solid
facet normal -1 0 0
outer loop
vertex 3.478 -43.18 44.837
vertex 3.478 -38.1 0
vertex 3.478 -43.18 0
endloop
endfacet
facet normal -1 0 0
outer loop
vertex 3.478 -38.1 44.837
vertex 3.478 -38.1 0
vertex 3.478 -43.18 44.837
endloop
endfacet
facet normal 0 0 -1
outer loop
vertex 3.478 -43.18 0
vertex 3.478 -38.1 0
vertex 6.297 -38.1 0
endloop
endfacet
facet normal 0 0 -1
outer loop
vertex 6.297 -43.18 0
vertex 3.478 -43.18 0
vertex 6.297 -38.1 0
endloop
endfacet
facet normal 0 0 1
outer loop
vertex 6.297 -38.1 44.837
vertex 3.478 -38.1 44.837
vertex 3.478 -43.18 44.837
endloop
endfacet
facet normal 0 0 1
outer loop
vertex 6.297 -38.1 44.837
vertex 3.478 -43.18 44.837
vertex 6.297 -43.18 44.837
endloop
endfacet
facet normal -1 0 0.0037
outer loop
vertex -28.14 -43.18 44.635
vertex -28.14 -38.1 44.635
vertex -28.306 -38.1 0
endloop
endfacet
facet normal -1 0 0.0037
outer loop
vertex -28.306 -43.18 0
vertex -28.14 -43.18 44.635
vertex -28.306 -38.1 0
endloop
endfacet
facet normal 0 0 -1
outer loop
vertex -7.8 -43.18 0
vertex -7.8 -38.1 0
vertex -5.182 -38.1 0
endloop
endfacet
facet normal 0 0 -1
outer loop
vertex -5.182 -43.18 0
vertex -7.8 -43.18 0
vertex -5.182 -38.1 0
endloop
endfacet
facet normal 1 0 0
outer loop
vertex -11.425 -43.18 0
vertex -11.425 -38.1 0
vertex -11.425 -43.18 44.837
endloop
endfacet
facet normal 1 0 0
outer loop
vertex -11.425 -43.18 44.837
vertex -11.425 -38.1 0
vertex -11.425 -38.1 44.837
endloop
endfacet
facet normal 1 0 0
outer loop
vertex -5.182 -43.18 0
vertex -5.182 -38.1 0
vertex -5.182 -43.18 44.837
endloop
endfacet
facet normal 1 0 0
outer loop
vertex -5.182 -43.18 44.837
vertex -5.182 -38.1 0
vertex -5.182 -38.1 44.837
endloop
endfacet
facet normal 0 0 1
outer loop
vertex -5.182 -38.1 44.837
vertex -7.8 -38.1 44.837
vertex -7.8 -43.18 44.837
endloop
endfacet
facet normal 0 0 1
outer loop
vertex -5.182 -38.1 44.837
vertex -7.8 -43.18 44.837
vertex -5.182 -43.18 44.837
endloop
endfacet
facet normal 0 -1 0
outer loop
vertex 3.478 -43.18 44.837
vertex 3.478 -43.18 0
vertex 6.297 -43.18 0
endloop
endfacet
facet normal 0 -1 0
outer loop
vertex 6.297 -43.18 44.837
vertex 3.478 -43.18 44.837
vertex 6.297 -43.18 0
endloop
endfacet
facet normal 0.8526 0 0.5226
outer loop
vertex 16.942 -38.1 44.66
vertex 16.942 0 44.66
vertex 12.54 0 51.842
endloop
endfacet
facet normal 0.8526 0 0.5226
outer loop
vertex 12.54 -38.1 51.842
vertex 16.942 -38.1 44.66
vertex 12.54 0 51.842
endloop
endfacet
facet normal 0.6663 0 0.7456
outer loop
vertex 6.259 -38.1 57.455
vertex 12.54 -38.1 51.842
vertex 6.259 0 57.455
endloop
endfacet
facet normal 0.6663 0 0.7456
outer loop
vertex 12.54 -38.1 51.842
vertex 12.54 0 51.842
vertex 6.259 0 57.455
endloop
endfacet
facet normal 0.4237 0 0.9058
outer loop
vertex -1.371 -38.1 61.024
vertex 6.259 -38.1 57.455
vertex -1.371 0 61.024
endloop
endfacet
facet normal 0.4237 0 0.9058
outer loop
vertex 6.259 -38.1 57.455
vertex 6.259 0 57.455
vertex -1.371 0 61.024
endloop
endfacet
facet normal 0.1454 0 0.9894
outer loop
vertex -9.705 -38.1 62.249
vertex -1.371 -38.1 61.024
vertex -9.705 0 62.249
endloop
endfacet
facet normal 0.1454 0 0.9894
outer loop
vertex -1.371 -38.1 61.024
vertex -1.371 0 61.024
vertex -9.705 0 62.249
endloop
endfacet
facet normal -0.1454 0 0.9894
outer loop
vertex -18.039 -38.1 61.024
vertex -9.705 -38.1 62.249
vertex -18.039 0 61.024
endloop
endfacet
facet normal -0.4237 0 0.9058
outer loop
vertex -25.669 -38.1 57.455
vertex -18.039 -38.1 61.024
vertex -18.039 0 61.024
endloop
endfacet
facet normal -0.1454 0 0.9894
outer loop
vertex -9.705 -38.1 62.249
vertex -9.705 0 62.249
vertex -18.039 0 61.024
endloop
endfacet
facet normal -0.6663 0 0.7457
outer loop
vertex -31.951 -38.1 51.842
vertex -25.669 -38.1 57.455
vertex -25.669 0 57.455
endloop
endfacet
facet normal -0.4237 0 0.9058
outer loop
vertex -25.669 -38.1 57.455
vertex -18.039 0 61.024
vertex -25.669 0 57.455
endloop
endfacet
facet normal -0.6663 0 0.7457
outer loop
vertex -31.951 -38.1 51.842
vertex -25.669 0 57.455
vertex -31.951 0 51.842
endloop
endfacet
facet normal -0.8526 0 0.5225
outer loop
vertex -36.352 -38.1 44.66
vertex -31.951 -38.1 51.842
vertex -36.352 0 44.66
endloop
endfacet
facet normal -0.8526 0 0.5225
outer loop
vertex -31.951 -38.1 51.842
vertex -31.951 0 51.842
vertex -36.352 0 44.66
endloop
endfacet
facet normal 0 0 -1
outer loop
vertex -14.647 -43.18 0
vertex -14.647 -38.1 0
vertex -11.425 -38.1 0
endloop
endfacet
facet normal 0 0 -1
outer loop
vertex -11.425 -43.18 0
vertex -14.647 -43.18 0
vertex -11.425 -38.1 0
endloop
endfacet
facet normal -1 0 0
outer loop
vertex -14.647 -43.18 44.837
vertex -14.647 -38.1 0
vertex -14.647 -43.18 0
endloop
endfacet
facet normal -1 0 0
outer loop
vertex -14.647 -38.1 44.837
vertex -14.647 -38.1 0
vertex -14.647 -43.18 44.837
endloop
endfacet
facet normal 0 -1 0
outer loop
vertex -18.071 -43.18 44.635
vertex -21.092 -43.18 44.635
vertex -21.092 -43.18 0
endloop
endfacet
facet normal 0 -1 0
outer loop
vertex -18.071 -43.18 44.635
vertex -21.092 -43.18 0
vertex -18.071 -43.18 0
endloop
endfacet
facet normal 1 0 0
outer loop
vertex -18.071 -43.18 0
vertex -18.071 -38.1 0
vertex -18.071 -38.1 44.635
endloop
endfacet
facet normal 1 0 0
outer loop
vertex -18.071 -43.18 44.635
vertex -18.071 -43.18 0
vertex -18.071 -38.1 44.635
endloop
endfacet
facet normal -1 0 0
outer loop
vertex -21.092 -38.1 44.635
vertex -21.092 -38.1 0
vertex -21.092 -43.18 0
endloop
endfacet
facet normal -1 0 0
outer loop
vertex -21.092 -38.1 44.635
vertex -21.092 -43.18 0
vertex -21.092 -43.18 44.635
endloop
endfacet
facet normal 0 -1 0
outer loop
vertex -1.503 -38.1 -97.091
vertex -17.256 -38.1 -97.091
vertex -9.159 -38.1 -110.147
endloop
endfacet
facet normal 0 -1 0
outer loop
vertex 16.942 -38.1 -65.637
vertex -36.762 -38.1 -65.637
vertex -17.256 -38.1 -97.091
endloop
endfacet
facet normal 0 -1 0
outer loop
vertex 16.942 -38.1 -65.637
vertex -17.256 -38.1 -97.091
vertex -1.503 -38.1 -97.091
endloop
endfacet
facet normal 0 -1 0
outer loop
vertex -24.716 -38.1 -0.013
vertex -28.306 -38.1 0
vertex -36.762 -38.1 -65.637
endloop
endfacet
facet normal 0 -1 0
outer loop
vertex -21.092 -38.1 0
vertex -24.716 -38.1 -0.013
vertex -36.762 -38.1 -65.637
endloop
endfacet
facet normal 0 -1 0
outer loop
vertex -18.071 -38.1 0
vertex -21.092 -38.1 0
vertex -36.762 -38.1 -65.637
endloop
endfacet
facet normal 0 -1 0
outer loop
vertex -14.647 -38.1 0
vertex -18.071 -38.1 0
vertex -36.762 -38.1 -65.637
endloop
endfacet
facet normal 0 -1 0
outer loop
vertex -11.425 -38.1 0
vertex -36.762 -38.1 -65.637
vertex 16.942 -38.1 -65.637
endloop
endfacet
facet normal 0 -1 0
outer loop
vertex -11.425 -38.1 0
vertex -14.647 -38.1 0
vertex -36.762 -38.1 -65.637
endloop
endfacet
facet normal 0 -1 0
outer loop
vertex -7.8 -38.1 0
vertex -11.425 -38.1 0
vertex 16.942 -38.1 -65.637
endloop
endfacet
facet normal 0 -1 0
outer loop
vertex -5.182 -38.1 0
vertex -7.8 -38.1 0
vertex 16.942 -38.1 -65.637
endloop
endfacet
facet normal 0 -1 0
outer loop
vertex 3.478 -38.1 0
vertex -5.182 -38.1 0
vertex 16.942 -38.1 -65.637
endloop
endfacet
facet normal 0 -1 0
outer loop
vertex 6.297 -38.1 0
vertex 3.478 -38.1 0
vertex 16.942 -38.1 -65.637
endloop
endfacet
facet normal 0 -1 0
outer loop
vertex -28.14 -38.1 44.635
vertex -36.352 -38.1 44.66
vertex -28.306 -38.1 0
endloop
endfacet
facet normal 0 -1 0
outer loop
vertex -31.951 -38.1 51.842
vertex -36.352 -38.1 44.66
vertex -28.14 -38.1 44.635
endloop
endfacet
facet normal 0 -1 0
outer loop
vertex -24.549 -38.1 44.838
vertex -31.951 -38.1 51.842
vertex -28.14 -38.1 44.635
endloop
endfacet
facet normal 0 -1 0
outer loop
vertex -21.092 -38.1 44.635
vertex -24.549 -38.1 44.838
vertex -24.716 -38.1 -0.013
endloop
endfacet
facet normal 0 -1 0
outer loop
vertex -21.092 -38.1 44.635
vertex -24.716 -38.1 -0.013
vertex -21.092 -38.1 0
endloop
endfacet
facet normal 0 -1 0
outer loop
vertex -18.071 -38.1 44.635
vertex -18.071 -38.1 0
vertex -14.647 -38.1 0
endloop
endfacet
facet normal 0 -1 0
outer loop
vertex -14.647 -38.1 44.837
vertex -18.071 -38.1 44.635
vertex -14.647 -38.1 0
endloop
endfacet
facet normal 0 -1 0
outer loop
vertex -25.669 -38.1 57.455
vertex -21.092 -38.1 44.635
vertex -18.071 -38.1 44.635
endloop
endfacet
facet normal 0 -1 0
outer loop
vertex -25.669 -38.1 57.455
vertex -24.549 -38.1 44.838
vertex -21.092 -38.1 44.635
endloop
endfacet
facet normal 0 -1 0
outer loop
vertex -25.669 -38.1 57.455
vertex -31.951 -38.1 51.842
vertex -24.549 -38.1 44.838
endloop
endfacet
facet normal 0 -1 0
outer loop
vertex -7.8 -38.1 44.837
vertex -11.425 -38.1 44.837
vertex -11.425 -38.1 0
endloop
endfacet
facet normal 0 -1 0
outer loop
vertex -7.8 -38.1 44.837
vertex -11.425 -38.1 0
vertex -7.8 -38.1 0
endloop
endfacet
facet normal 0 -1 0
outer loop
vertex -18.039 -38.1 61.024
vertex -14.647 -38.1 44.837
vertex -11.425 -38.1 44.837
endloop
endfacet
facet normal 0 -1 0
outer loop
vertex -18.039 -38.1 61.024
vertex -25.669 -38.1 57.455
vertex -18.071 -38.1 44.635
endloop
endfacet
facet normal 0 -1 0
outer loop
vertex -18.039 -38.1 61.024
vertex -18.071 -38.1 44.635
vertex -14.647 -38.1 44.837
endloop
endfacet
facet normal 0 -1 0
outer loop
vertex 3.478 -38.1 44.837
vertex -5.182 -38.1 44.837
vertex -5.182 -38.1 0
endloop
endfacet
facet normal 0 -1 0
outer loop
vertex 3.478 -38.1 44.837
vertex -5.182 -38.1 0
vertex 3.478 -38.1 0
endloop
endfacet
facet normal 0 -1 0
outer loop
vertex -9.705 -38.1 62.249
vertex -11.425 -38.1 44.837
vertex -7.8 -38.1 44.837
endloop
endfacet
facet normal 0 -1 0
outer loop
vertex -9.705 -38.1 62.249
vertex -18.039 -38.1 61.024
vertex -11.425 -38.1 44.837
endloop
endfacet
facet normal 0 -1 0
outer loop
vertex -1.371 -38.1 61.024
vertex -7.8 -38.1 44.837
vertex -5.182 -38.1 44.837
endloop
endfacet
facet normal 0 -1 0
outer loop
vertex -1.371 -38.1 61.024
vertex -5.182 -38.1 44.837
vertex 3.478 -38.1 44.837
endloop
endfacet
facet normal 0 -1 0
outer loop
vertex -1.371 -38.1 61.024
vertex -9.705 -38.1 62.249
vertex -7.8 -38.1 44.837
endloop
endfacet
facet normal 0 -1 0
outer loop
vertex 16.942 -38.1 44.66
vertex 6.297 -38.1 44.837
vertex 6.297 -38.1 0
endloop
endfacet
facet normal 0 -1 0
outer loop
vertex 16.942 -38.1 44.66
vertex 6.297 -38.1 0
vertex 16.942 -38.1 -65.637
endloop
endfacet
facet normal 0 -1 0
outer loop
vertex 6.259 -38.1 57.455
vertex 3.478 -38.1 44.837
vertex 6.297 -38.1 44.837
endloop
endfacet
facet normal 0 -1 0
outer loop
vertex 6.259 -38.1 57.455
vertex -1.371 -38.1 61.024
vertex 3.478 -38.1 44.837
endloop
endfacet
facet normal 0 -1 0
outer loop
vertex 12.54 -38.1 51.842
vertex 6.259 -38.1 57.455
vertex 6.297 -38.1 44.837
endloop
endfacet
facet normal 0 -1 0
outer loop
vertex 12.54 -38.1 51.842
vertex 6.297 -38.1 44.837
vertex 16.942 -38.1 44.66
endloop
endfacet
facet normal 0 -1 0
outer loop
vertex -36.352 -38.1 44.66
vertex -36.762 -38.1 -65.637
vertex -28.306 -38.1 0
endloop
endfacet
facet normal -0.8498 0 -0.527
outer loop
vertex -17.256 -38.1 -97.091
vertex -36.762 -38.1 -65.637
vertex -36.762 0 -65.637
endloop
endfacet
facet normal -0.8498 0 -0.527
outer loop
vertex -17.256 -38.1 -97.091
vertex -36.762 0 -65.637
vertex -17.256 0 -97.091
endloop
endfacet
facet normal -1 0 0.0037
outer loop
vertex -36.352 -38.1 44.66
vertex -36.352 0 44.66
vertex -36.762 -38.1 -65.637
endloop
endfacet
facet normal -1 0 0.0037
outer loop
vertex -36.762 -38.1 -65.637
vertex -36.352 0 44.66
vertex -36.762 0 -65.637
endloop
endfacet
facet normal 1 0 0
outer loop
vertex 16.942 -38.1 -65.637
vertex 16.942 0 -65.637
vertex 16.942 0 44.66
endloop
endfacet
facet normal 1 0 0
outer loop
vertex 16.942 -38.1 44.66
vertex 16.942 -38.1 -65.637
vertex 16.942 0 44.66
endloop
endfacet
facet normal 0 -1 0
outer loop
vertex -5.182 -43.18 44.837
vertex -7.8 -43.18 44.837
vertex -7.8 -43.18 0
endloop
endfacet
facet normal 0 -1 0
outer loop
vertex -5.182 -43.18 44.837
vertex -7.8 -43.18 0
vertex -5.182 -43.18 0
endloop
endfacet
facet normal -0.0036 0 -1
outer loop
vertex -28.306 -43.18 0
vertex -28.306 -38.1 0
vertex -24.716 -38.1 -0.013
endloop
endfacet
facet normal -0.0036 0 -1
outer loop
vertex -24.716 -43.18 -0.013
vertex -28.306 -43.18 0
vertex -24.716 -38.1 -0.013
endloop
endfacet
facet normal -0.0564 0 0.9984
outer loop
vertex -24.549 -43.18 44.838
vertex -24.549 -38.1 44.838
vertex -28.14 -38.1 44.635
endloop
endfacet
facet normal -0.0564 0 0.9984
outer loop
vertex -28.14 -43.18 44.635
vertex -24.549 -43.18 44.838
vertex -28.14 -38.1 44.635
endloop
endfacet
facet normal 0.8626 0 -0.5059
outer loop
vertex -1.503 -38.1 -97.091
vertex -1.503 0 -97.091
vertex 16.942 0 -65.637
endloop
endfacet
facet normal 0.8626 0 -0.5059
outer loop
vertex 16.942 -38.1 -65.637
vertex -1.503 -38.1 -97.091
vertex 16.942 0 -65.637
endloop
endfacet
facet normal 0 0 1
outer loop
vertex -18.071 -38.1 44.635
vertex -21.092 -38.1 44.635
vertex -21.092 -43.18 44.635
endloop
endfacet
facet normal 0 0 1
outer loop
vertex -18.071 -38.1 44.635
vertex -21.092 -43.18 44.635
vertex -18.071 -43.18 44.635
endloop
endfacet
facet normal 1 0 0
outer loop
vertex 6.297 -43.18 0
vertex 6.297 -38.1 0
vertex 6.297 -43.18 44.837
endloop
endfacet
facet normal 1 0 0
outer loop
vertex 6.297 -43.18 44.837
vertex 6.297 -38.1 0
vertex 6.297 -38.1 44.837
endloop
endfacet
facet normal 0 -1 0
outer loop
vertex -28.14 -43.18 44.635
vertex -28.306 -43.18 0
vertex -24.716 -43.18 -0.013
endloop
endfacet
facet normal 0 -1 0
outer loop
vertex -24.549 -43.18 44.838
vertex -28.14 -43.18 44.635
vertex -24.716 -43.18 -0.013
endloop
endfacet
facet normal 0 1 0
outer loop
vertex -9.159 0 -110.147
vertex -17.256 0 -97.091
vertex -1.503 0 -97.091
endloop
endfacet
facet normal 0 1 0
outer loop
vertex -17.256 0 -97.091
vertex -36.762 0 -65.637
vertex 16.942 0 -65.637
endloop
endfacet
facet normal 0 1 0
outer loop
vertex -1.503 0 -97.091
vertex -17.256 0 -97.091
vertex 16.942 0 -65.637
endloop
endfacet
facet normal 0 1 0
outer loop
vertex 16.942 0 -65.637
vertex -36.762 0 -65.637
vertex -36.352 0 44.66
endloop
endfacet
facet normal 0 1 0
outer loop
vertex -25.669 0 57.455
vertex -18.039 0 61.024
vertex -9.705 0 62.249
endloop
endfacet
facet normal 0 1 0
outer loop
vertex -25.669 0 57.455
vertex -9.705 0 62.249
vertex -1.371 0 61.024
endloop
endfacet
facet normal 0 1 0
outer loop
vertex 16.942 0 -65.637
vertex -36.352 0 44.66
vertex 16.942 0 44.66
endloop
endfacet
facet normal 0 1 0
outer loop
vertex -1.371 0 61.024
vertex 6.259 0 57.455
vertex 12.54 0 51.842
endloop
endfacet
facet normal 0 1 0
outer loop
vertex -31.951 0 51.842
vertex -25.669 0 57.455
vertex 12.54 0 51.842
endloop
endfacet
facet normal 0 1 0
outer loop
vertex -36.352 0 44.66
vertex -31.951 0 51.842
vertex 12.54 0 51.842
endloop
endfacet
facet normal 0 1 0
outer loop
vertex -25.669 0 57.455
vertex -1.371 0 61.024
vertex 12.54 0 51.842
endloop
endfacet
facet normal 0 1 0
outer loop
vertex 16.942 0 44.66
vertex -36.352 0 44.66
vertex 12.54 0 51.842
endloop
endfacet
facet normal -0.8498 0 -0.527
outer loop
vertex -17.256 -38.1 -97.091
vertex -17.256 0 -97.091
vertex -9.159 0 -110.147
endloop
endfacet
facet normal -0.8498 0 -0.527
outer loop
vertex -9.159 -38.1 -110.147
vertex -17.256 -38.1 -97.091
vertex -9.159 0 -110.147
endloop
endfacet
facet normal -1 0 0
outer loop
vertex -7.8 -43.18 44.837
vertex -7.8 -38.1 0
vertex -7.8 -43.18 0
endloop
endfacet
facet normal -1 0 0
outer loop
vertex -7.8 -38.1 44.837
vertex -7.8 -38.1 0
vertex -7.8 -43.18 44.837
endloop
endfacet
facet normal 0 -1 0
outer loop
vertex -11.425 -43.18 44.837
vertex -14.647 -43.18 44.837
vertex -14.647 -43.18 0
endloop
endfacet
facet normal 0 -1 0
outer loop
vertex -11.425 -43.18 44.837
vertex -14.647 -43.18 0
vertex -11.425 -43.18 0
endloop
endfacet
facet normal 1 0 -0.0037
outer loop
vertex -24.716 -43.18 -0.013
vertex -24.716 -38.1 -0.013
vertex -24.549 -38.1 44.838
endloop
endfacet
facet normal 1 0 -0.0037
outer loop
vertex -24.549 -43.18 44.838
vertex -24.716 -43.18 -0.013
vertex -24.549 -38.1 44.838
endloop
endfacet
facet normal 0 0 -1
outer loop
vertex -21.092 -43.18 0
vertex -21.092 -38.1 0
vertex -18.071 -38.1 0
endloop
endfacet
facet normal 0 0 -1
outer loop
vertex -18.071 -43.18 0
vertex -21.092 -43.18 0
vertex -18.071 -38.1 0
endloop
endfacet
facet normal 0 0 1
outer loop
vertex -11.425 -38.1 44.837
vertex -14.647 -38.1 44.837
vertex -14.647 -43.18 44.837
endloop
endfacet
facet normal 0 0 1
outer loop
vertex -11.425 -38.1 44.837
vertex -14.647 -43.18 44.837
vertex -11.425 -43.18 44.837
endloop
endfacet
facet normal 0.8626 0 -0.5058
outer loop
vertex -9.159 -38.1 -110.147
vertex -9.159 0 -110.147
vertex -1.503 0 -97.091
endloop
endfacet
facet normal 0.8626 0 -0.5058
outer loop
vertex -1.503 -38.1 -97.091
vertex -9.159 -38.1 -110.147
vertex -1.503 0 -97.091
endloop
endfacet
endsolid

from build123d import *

# Parameters (mm, degrees)
F1_DEPTH = 38.1
F2_W     = 3.020811
F2_H     = 44.635244
F2_W_2   = 3.2222
F2_H_2   = 44.836629
F2_W_3   = 2.618038
F2_W_4   = 2.819423
F3_DEPTH = 5.08


with BuildPart() as f1:
    # F0 (on Front) → F1 (new body)
    with BuildSketch(Plane.XZ):
        Polygon((16.942143, 44.659857), (-36.352359, 44.659857), (-36.762383, -65.636605), (-17.255633, -97.091005), (-1.502697, -97.091005), (16.942143, -65.636605), align=None)
        with BuildLine():
            ThreePointArc((16.942143, 44.659857), (-9.705108, 62.248629), (-36.352359, 44.659857))
            Line((-36.352359, 44.659857), (16.942143, 44.659857))
        make_face()
        Polygon((-1.502697, -97.091005), (-17.255633, -97.091005), (-9.158776, -110.147089), align=None)
    extrude(amount=F1_DEPTH)

    # F2 (on face) → F3 (join)
    with BuildSketch(Plane.XZ.offset(38.1)):
        Polygon((-24.548945, 44.838252), (-28.140236, 44.635244), (-28.306166, 0), (-24.71568, -0.013348), align=None)
        with Locations((-19.581269, 22.317622)):
            Rectangle(F2_W, F2_H)
        with Locations((-13.036178, 22.418314)):
            Rectangle(F2_W_2, F2_H_2)
        with Locations((-6.491086, 22.418314)):
            Rectangle(F2_W_3, F2_H_2)
        with Locations((4.887302, 22.418314)):
            Rectangle(F2_W_4, F2_H_2)
    extrude(amount=F3_DEPTH)


solid = f1.part
